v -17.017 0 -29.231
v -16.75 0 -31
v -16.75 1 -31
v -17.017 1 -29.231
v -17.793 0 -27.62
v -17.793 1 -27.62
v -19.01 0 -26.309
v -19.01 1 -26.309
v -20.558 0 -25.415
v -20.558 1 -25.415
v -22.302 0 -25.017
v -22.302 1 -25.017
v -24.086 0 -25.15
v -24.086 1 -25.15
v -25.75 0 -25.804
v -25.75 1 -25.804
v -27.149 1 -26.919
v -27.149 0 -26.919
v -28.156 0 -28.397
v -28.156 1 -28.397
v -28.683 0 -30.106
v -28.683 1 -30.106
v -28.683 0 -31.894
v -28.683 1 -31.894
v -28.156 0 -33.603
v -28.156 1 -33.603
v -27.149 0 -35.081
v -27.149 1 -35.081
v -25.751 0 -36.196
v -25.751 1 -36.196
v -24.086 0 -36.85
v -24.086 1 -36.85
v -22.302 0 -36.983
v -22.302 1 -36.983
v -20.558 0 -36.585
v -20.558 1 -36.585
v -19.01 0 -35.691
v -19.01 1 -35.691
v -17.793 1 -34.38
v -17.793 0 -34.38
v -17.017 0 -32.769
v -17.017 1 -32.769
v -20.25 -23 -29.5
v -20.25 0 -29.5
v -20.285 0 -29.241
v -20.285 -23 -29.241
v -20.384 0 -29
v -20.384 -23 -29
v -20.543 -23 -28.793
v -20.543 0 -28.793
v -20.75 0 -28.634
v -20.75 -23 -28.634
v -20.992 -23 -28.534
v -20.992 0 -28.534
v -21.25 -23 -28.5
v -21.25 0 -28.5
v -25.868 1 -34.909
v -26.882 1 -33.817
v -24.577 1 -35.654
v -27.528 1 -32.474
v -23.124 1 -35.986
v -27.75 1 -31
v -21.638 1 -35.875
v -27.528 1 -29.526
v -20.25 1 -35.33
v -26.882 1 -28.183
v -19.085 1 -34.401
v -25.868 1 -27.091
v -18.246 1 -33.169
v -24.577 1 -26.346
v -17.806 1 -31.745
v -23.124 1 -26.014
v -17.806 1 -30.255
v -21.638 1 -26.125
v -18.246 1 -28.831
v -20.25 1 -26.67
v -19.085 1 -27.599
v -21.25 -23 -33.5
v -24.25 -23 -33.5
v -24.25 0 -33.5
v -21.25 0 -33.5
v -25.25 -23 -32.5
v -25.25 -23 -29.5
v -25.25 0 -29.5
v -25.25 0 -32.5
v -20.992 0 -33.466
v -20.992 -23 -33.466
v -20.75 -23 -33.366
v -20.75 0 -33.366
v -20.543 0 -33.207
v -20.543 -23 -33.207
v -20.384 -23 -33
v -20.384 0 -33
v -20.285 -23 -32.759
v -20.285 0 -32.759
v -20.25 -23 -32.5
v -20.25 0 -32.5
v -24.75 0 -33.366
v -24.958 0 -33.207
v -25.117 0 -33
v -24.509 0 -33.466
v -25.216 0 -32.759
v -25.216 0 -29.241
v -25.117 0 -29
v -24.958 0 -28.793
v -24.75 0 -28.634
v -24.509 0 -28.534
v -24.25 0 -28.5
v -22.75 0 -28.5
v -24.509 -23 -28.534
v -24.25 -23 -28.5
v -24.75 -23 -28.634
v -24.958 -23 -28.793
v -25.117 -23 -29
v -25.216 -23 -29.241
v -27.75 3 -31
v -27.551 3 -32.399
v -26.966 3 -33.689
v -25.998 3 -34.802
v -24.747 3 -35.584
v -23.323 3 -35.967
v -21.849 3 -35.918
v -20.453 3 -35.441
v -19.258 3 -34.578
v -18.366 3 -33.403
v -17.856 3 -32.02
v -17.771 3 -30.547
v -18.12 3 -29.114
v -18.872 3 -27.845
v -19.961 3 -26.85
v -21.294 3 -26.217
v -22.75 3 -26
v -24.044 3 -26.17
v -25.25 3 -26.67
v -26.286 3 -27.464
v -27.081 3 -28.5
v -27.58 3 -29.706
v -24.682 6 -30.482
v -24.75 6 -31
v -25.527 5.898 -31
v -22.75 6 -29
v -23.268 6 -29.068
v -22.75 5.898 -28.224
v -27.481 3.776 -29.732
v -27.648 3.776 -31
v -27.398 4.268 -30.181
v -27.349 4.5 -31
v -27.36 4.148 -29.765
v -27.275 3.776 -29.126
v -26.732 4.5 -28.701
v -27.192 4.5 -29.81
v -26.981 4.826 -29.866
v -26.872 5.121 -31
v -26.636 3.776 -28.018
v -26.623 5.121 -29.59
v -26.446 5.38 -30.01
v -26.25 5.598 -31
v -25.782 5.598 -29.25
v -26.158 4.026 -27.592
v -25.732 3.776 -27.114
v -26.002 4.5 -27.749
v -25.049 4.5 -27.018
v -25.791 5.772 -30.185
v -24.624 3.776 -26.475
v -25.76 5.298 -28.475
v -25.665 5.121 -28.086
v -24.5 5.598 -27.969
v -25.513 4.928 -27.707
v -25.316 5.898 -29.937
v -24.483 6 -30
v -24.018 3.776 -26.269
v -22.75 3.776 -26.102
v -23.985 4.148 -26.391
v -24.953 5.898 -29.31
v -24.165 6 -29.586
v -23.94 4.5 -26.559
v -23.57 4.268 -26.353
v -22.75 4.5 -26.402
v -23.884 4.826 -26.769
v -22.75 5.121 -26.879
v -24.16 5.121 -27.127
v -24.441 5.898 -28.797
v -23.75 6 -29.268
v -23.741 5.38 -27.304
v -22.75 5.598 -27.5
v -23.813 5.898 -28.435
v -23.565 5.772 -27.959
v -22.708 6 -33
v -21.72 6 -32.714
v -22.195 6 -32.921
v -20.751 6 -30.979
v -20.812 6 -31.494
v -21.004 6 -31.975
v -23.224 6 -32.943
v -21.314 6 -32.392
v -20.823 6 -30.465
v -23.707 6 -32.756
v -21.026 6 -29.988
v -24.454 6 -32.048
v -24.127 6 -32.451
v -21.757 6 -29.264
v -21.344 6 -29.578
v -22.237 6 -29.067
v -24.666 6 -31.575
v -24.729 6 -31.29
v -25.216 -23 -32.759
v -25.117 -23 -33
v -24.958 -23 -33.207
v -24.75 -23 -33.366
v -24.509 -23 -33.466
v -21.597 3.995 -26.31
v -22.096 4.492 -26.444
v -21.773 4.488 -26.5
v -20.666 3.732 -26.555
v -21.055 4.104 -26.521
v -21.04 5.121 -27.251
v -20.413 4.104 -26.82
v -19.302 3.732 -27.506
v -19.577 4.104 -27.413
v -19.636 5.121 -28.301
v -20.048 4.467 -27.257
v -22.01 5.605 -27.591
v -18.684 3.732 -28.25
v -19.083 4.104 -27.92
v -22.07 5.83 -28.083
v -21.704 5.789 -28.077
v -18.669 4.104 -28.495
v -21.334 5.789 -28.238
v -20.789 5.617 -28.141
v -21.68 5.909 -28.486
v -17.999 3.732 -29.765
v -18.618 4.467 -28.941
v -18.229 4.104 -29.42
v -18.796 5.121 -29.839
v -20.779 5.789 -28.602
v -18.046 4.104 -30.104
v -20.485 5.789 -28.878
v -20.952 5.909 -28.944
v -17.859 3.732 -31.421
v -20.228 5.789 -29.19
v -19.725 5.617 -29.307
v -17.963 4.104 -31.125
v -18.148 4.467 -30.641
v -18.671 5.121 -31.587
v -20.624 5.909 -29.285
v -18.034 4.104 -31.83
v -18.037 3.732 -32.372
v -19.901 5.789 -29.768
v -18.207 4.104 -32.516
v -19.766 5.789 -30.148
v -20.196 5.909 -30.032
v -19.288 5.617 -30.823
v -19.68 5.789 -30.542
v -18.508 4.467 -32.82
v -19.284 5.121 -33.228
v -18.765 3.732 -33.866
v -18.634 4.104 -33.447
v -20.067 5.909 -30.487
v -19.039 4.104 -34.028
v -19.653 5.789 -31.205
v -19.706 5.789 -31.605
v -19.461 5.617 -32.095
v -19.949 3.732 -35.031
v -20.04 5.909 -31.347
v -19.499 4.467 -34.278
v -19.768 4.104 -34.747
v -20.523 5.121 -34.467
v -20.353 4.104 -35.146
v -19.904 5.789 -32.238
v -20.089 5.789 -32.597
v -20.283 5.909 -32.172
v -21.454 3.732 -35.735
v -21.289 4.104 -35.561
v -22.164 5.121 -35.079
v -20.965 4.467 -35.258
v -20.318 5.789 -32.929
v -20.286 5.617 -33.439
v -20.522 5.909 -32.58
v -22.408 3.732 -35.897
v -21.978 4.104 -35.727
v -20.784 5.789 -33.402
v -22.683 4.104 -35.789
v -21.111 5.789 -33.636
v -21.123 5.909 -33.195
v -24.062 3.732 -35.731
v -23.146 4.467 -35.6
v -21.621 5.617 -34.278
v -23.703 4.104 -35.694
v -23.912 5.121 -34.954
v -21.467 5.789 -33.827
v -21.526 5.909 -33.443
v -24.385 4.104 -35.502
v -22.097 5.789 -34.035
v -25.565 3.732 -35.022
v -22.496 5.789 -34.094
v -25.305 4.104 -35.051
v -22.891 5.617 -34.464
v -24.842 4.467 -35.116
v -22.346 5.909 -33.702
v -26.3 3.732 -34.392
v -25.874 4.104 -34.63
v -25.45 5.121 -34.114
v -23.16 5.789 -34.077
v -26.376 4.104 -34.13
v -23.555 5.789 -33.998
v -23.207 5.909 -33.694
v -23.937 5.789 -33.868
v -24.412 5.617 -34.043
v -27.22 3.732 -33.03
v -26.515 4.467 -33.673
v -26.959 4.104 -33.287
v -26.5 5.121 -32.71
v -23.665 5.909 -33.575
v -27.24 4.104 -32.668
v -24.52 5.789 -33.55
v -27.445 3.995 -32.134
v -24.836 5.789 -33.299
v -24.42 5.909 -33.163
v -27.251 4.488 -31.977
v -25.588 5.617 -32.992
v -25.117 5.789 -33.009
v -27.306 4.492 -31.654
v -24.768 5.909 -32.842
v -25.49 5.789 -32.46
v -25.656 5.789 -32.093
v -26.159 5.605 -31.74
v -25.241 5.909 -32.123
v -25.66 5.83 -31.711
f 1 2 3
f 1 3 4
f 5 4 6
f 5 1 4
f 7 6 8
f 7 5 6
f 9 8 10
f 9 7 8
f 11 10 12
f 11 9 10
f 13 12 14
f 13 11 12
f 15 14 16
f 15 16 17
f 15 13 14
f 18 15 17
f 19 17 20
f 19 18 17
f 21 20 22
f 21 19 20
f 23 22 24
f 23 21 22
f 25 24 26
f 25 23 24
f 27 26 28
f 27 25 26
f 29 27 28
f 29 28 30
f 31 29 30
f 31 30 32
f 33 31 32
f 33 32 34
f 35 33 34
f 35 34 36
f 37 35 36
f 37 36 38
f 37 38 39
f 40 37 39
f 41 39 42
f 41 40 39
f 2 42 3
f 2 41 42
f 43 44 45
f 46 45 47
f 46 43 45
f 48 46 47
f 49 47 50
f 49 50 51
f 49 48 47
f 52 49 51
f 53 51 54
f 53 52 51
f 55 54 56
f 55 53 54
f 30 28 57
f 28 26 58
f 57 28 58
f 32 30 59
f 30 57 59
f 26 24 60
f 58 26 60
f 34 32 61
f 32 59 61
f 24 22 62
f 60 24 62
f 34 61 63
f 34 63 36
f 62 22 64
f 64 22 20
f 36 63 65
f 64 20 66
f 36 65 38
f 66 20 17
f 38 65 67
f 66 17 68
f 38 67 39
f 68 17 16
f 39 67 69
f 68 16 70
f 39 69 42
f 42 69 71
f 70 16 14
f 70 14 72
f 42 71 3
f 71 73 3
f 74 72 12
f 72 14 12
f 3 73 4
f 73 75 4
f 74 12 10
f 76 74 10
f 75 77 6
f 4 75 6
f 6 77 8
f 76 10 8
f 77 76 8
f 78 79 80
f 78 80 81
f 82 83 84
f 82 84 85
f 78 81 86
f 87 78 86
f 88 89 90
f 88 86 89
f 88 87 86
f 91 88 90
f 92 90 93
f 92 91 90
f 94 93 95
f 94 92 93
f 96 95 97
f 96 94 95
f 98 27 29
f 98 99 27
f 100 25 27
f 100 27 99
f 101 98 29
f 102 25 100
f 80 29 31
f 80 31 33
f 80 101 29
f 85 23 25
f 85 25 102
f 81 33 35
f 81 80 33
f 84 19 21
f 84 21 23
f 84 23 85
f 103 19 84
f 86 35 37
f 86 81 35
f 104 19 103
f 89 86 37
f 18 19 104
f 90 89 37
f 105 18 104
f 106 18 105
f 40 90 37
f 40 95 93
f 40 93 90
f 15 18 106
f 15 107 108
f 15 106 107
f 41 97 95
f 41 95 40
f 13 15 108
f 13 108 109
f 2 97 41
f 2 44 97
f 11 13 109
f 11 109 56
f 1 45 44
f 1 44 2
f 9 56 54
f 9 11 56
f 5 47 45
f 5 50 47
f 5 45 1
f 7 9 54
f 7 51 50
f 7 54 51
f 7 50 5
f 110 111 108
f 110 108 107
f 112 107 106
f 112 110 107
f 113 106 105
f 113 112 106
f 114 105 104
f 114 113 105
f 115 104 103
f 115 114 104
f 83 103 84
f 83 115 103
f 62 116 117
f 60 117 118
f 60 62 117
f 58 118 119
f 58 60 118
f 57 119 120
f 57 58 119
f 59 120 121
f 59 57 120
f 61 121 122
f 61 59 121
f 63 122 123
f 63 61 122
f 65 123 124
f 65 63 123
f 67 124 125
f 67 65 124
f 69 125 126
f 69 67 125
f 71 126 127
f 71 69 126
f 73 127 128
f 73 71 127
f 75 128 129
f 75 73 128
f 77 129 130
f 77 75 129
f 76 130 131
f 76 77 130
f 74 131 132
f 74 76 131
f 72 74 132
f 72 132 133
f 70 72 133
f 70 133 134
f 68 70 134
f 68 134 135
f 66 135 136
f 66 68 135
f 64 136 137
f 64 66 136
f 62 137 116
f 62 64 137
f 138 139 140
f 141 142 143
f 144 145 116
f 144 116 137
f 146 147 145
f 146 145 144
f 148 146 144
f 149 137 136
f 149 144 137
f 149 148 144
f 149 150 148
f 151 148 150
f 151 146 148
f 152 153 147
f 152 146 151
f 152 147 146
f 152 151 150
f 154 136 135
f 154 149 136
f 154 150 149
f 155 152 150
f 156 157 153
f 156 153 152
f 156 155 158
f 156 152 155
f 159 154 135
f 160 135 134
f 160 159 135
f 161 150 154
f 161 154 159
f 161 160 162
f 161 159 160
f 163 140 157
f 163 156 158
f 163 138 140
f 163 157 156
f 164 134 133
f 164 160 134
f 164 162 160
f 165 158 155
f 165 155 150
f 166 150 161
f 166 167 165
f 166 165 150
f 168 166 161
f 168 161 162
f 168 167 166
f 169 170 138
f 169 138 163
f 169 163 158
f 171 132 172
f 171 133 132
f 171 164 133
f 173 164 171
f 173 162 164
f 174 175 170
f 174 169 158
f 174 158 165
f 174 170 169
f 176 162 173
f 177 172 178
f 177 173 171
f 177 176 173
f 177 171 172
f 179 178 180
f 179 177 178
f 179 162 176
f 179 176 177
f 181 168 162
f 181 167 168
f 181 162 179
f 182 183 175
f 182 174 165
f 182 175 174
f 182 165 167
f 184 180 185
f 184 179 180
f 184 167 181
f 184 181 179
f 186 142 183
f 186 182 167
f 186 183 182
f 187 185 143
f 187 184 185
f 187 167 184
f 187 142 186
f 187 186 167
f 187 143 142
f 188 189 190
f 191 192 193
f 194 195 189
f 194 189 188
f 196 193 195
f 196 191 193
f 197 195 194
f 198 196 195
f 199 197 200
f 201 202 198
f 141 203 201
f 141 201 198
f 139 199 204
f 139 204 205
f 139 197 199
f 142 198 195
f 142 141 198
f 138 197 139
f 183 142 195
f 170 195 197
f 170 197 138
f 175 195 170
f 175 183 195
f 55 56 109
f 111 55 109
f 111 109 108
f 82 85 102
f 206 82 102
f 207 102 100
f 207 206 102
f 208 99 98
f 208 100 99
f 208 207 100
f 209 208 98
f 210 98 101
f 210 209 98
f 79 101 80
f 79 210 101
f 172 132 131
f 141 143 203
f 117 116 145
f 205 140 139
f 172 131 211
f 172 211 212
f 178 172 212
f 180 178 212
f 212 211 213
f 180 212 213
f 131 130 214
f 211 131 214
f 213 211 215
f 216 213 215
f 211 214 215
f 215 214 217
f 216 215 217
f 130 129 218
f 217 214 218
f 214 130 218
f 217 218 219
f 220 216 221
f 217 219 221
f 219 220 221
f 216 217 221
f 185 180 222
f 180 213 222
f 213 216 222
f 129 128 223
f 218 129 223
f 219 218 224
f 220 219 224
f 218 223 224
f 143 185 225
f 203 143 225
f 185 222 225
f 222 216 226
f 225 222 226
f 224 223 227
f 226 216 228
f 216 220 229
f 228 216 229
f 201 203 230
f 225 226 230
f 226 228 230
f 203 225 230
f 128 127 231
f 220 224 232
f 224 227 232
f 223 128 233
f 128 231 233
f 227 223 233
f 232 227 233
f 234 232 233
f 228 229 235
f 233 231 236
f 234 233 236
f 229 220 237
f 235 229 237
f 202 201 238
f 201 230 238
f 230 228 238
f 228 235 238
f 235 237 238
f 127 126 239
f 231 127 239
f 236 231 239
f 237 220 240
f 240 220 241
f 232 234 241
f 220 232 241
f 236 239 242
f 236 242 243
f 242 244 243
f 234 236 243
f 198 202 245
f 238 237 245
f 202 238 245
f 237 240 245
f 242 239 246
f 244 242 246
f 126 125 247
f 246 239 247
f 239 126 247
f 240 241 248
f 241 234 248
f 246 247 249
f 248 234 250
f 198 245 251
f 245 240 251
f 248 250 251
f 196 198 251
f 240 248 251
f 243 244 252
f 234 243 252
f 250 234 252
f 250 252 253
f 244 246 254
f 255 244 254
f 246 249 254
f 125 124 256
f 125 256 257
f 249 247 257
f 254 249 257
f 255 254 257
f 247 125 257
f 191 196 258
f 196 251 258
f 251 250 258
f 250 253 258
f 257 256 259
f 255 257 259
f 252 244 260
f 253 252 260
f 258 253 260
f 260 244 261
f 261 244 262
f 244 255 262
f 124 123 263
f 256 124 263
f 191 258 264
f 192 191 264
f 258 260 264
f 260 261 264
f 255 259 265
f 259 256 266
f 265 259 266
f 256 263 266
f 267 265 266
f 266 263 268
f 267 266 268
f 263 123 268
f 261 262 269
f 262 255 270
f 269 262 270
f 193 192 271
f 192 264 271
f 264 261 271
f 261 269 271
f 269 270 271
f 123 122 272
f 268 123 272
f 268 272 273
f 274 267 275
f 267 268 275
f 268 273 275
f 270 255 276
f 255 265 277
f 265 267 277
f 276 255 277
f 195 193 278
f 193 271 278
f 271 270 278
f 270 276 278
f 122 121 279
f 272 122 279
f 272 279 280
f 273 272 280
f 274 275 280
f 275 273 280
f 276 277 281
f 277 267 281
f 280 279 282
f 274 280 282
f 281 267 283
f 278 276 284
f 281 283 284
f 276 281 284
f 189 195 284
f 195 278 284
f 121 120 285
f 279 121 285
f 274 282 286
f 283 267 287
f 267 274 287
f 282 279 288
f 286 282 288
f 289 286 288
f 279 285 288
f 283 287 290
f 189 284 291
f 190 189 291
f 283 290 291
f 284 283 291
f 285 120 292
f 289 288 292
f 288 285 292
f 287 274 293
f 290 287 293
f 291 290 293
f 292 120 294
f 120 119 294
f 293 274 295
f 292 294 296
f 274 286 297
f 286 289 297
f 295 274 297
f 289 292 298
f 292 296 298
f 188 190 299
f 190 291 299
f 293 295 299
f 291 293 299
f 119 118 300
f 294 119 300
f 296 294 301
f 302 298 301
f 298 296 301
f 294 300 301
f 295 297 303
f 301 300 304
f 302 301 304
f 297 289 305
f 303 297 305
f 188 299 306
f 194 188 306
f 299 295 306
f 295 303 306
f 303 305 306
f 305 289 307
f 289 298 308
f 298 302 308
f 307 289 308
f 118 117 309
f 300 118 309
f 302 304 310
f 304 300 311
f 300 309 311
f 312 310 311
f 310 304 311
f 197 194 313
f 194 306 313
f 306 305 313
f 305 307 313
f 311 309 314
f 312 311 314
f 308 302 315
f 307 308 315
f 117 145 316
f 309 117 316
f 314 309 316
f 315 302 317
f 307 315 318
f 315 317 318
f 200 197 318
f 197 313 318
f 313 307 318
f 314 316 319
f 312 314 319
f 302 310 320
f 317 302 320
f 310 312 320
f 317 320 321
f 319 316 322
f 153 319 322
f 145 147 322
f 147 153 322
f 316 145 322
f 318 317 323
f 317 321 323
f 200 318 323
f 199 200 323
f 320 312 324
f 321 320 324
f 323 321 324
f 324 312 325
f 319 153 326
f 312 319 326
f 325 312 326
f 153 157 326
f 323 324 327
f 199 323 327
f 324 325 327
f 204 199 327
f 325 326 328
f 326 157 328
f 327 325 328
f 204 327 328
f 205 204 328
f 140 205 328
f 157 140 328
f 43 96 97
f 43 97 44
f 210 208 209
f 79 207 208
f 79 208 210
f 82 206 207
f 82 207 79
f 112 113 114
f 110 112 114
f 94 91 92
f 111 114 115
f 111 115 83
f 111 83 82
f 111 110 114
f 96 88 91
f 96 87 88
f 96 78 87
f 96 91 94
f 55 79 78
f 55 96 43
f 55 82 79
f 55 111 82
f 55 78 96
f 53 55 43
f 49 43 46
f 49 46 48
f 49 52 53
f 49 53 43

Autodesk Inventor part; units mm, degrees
ref_plane "YZ Plane" through (0, 0, 0) normal (1, 0, 0) x (0, 1, 0)
ref_plane "XZ Plane" through (0, 0, 0) normal (0, 1, 0) x (-1, 0, 0)
ref_plane "XY Plane" through (0, 0, 0) normal (0, 0, 1) x (1, 0, 0)
sketch "MainSketch" plane through (0, 0, 0) normal (0, 1, 0) x (-1, 0, 0)
  line L0 (31, -50) -> (-31, -50)
  line L1 (-31, -50) -> (-31, 50)
  line L2 (-31, 50) -> (31, 50)
  line L3 (31, 50) -> (31, -50)
  line L4 (31, -49.4494) -> (-31, 50.5506) construction
  line L5 (-31, -50) -> (31, 50) construction
  line L6 (31, 50) -> (-31, 50)
  line L7 (-31, 50) -> (-31, 21.5)
  line L8 (-31, 21.5) -> (31, 21.5)
  line L9 (31, 21.5) -> (31, 50)
  line L10 (-31, -50) -> (16, -50)
  line L11 (16, -50) -> (16, 21.5)
  line L12 (16, 21.5) -> (-31, 21.5)
  line L13 (-31, 21.5) -> (-31, -50)
  line L14 (31, 21.5) -> (16, 21.5)
  line L15 (16, 21.5) -> (16, -50)
  line L16 (16, -50) -> (31, -50)
  line L17 (31, -50) -> (31, 21.5)
  line L18 (-31, 21.5) -> (-31, 35.75)
  line L19 (-31, 21.5) -> (-31, 35.75)
  arc A0 (0, 50) -> (-31, 21.5) centre (0.8091, 18.0102) ccw
  line L20 (29.5, 48.5) -> (-29.5, 48.5)
  line L21 (-29.5, 48.5) -> (-29.5, -48.5)
  line L22 (-29.5, -48.5) -> (29.5, -48.5)
  line L23 (29.5, -48.5) -> (29.5, 48.5)
  line L24 (29.5, 48.5) -> (-29.5, -48.5) construction
  line L25 (-29.5, 48.5) -> (29.5, -48.5) construction
  line L26 (-29.5, -48.5) -> (16, -48.5)
  line L27 (16, -48.5) -> (16, 2.2597)
  line L28 (16, 2.2597) -> (-29.5, 2.2597)
  line L29 (-29.5, 2.2597) -> (-29.5, -48.5)
  line L30 (16, -48.5) -> (29.5, -48.5)
  line L31 (29.5, -48.5) -> (29.5, 11.5)
  line L32 (29.5, 11.5) -> (16, 11.5)
  line L33 (16, 11.5) -> (16, -48.5)
  line L34 (29.5, 21.5) -> (16, 21.5)
  line L35 (16, 21.5) -> (16, 11.5)
  line L36 (16, 11.5) -> (29.5, 11.5)
  line L37 (29.5, 11.5) -> (29.5, 21.5)
  line L38 (29.5, 21.5) -> (29.5, 11.5)
  line L39 (29.5, 16.5) -> (16, 16.5)
  line L40 (22.75, 16.5) -> (22.75, 11.5)
  line L41 (22.75, 16.5) -> (22.75, 21.5)
  circle A1 centre (22.75, 16.5) radius 4
  arc A2 (0, 48.5) -> (-29.5, 21.5) centre (0.9166, 17.8828) ccw
  line L42 (-20.0675, 15.4609) -> (-7.0675, 15.4609)
  line L43 (-7.0675, 15.4609) -> (-7.0675, -23.5689)
  line L44 (-7.0675, -23.5689) -> (-20.0675, -23.5689)
  line L45 (-20.0675, -23.5689) -> (-20.0675, 15.4609)
  line L46 (22.75, 11.5) -> (22.75, -28.5)
  line L47 (22.75, 11.5) -> (62.75, 11.5) construction
  line L48 (20.2505, -33.5) -> (20.2505, -28.5)
  line L49 (22.75, -28.5) -> (25.2505, -28.5)
  line L50 (20.2505, -28.5) -> (25.2505, -28.5)
  line L51 (25.2505, -28.5) -> (25.2505, -33.5)
  line L52 (25.2505, -33.5) -> (20.2505, -33.5)
  line L53 (20.2505, -33.5) -> (20.2505, -28.5)
  line L54 (25.2505, -28.5) -> (20.2505, -33.5)
  line L55 (20.2505, -28.5) -> (25.2505, -33.5)
  circle A3 centre (22.7505, -31) radius 5
  line L56 (-7.0675, 15.4609) -> (-20.0675, 15.4609)
  line L57 (-20.0675, 15.4609) -> (-20.0675, 10.4609)
  line L58 (-20.0675, 10.4609) -> (-7.0675, 10.4609)
  line L59 (-7.0675, 10.4609) -> (-7.0675, 15.4609)
  line L60 (-7.0675, -23.5689) -> (-20.0675, -23.5689)
  line L61 (-20.0675, -23.5689) -> (-20.0675, -18.5689)
  line L62 (-20.0675, -18.5689) -> (-7.0675, -18.5689)
  line L63 (-7.0675, -18.5689) -> (-7.0675, -23.5689)
  line L64 (-29.5, -48.5) -> (-16.5, -48.5)
  line L65 (-16.5, -48.5) -> (-8.5, -48.5)
  line L66 (-8.5, -48.5) -> (-8.5, -42.5)
  line L67 (-8.5, -42.5) -> (-16.5, -42.5)
  line L68 (-16.5, -42.5) -> (-16.5, -48.5)
  line L69 (-8.5, -42.5) -> (-4.5, -42.5)
  line L70 (-8.5, -42.5) -> (-4.5, -42.5) construction
  line L71 (-4.5, -42.5) -> (-3.5, -42.5)
  line L72 (-3.5, -42.5) -> (-3.5, -40.5)
  line L73 (-3.5, -40.5) -> (-4.5, -40.5)
  line L74 (-4.5, -40.5) -> (-4.5, -42.5)
  line L75 (-4.5, -42.5) -> (-3.5, -42.5)
  line L76 (-3.5, -42.5) -> (-3.5, -44.5)
  line L77 (-3.5, -44.5) -> (-4.5, -44.5)
  line L78 (-4.5, -44.5) -> (-4.5, -42.5)
  line L79 (-8.5, -42.5) -> (-8.5, -10.5)
  line L80 (-8.5, -10.5) -> (-10.5, -10.5)
  line L81 (-10.5, -10.5) -> (-10.5, -9.5)
  line L82 (-10.5, -9.5) -> (-8.5, -9.5)
  line L83 (-8.5, -9.5) -> (-8.5, -10.5)
  line L84 (-8.5, -42.5) -> (-8.5, -37.5)
  line L85 (-8.5, -37.5) -> (-9.5, -37.5)
  line L86 (-9.5, -37.5) -> (-9.5, -39.5)
  line L87 (-9.5, -39.5) -> (-8.5, -39.5)
  line L88 (-8.5, -39.5) -> (-8.5, -37.5)
  point P0 (0, 0)
  dimension "d0" = 62
  dimension "d1" = 100
  dimension "d2" = 62
  dimension "d3" = 28.5
  dimension "d4" = 47
  dimension "d5" = 32
  dimension "d6" = 59
  dimension "d7" = 97
  dimension "d8" = 60
  dimension "d9" = 8
  dimension "d10" = 39.0299
  dimension "d11" = 13
  dimension "d12" = 40
  dimension "d13" = 90
  dimension "d14" = 5
  dimension "d15" = 5
  dimension "d16" = 10
  dimension "d17" = 5
  dimension "d18" = 5
  dimension "d19" = 13
  dimension "d20" = 8
  dimension "d21" = 6
  dimension "d22" = 4
  dimension "d23" = 0
  dimension "d24" = 1
  dimension "d25" = 2
  dimension "d26" = 2
  dimension "d27" = 32
  dimension "d28" = 2
  dimension "d29" = 1
  dimension "d30" = 5
  dimension "d31" = 1
  dimension "d32" = 2
extrude "MainExtrusion" add sketch "MainSketch" along normal blind 6 contours L49 L54 L55 L50 | A3 | L51 L55 L54 | L55 L54 L48 | L52 L54 L55
sketch "ButtonBlockerSketch" plane through (-22.7505, 0, -31) normal (0, -1, 0) x (1, 0, 0)
  circle A0 centre (0, 0) radius 6
  point P0 (22.7505, 31)
  dimension "d35" = 12
extrude "ButtonBlockerExtrusion" add sketch "ButtonBlockerSketch" against normal blind 1
fillet "MainConnection" radius 3 1 edges at (-17.7505, 6, -31)
sketch "ClickerProtusionSketch" plane through (-22.7505, 0, -31) normal (0, -1, 0) x (1, 0, 0)
  line L0 (2.5, 2.5) -> (-2.5, 2.5)
  line L1 (-2.5, 2.5) -> (-2.5, -2.5)
  line L2 (-2.5, -2.5) -> (2.5, -2.5)
  line L3 (2.5, -2.5) -> (2.5, 2.5)
  line L4 (2.5, 2.5) -> (-2.5, -2.5) construction
  line L5 (-2.5, 2.5) -> (2.5, -2.5) construction
  point P0 (22.7505, 31)
  point P1 (0, 0)
  dimension "d39" = 5
  dimension "d40" = 5
extrude "ClickerProtusionExtrusion" add sketch "ClickerProtusionSketch" along normal blind 23
fillet "ClickerProtusionConnection" radius 1 4 edges at (-20.2505, -11.5, -33.5) (-20.2505, -11.5, -28.5) (-25.2505, -11.5, -33.5) (-25.2505, -11.5, -28.5)
properties part number "EvoTest_body"
